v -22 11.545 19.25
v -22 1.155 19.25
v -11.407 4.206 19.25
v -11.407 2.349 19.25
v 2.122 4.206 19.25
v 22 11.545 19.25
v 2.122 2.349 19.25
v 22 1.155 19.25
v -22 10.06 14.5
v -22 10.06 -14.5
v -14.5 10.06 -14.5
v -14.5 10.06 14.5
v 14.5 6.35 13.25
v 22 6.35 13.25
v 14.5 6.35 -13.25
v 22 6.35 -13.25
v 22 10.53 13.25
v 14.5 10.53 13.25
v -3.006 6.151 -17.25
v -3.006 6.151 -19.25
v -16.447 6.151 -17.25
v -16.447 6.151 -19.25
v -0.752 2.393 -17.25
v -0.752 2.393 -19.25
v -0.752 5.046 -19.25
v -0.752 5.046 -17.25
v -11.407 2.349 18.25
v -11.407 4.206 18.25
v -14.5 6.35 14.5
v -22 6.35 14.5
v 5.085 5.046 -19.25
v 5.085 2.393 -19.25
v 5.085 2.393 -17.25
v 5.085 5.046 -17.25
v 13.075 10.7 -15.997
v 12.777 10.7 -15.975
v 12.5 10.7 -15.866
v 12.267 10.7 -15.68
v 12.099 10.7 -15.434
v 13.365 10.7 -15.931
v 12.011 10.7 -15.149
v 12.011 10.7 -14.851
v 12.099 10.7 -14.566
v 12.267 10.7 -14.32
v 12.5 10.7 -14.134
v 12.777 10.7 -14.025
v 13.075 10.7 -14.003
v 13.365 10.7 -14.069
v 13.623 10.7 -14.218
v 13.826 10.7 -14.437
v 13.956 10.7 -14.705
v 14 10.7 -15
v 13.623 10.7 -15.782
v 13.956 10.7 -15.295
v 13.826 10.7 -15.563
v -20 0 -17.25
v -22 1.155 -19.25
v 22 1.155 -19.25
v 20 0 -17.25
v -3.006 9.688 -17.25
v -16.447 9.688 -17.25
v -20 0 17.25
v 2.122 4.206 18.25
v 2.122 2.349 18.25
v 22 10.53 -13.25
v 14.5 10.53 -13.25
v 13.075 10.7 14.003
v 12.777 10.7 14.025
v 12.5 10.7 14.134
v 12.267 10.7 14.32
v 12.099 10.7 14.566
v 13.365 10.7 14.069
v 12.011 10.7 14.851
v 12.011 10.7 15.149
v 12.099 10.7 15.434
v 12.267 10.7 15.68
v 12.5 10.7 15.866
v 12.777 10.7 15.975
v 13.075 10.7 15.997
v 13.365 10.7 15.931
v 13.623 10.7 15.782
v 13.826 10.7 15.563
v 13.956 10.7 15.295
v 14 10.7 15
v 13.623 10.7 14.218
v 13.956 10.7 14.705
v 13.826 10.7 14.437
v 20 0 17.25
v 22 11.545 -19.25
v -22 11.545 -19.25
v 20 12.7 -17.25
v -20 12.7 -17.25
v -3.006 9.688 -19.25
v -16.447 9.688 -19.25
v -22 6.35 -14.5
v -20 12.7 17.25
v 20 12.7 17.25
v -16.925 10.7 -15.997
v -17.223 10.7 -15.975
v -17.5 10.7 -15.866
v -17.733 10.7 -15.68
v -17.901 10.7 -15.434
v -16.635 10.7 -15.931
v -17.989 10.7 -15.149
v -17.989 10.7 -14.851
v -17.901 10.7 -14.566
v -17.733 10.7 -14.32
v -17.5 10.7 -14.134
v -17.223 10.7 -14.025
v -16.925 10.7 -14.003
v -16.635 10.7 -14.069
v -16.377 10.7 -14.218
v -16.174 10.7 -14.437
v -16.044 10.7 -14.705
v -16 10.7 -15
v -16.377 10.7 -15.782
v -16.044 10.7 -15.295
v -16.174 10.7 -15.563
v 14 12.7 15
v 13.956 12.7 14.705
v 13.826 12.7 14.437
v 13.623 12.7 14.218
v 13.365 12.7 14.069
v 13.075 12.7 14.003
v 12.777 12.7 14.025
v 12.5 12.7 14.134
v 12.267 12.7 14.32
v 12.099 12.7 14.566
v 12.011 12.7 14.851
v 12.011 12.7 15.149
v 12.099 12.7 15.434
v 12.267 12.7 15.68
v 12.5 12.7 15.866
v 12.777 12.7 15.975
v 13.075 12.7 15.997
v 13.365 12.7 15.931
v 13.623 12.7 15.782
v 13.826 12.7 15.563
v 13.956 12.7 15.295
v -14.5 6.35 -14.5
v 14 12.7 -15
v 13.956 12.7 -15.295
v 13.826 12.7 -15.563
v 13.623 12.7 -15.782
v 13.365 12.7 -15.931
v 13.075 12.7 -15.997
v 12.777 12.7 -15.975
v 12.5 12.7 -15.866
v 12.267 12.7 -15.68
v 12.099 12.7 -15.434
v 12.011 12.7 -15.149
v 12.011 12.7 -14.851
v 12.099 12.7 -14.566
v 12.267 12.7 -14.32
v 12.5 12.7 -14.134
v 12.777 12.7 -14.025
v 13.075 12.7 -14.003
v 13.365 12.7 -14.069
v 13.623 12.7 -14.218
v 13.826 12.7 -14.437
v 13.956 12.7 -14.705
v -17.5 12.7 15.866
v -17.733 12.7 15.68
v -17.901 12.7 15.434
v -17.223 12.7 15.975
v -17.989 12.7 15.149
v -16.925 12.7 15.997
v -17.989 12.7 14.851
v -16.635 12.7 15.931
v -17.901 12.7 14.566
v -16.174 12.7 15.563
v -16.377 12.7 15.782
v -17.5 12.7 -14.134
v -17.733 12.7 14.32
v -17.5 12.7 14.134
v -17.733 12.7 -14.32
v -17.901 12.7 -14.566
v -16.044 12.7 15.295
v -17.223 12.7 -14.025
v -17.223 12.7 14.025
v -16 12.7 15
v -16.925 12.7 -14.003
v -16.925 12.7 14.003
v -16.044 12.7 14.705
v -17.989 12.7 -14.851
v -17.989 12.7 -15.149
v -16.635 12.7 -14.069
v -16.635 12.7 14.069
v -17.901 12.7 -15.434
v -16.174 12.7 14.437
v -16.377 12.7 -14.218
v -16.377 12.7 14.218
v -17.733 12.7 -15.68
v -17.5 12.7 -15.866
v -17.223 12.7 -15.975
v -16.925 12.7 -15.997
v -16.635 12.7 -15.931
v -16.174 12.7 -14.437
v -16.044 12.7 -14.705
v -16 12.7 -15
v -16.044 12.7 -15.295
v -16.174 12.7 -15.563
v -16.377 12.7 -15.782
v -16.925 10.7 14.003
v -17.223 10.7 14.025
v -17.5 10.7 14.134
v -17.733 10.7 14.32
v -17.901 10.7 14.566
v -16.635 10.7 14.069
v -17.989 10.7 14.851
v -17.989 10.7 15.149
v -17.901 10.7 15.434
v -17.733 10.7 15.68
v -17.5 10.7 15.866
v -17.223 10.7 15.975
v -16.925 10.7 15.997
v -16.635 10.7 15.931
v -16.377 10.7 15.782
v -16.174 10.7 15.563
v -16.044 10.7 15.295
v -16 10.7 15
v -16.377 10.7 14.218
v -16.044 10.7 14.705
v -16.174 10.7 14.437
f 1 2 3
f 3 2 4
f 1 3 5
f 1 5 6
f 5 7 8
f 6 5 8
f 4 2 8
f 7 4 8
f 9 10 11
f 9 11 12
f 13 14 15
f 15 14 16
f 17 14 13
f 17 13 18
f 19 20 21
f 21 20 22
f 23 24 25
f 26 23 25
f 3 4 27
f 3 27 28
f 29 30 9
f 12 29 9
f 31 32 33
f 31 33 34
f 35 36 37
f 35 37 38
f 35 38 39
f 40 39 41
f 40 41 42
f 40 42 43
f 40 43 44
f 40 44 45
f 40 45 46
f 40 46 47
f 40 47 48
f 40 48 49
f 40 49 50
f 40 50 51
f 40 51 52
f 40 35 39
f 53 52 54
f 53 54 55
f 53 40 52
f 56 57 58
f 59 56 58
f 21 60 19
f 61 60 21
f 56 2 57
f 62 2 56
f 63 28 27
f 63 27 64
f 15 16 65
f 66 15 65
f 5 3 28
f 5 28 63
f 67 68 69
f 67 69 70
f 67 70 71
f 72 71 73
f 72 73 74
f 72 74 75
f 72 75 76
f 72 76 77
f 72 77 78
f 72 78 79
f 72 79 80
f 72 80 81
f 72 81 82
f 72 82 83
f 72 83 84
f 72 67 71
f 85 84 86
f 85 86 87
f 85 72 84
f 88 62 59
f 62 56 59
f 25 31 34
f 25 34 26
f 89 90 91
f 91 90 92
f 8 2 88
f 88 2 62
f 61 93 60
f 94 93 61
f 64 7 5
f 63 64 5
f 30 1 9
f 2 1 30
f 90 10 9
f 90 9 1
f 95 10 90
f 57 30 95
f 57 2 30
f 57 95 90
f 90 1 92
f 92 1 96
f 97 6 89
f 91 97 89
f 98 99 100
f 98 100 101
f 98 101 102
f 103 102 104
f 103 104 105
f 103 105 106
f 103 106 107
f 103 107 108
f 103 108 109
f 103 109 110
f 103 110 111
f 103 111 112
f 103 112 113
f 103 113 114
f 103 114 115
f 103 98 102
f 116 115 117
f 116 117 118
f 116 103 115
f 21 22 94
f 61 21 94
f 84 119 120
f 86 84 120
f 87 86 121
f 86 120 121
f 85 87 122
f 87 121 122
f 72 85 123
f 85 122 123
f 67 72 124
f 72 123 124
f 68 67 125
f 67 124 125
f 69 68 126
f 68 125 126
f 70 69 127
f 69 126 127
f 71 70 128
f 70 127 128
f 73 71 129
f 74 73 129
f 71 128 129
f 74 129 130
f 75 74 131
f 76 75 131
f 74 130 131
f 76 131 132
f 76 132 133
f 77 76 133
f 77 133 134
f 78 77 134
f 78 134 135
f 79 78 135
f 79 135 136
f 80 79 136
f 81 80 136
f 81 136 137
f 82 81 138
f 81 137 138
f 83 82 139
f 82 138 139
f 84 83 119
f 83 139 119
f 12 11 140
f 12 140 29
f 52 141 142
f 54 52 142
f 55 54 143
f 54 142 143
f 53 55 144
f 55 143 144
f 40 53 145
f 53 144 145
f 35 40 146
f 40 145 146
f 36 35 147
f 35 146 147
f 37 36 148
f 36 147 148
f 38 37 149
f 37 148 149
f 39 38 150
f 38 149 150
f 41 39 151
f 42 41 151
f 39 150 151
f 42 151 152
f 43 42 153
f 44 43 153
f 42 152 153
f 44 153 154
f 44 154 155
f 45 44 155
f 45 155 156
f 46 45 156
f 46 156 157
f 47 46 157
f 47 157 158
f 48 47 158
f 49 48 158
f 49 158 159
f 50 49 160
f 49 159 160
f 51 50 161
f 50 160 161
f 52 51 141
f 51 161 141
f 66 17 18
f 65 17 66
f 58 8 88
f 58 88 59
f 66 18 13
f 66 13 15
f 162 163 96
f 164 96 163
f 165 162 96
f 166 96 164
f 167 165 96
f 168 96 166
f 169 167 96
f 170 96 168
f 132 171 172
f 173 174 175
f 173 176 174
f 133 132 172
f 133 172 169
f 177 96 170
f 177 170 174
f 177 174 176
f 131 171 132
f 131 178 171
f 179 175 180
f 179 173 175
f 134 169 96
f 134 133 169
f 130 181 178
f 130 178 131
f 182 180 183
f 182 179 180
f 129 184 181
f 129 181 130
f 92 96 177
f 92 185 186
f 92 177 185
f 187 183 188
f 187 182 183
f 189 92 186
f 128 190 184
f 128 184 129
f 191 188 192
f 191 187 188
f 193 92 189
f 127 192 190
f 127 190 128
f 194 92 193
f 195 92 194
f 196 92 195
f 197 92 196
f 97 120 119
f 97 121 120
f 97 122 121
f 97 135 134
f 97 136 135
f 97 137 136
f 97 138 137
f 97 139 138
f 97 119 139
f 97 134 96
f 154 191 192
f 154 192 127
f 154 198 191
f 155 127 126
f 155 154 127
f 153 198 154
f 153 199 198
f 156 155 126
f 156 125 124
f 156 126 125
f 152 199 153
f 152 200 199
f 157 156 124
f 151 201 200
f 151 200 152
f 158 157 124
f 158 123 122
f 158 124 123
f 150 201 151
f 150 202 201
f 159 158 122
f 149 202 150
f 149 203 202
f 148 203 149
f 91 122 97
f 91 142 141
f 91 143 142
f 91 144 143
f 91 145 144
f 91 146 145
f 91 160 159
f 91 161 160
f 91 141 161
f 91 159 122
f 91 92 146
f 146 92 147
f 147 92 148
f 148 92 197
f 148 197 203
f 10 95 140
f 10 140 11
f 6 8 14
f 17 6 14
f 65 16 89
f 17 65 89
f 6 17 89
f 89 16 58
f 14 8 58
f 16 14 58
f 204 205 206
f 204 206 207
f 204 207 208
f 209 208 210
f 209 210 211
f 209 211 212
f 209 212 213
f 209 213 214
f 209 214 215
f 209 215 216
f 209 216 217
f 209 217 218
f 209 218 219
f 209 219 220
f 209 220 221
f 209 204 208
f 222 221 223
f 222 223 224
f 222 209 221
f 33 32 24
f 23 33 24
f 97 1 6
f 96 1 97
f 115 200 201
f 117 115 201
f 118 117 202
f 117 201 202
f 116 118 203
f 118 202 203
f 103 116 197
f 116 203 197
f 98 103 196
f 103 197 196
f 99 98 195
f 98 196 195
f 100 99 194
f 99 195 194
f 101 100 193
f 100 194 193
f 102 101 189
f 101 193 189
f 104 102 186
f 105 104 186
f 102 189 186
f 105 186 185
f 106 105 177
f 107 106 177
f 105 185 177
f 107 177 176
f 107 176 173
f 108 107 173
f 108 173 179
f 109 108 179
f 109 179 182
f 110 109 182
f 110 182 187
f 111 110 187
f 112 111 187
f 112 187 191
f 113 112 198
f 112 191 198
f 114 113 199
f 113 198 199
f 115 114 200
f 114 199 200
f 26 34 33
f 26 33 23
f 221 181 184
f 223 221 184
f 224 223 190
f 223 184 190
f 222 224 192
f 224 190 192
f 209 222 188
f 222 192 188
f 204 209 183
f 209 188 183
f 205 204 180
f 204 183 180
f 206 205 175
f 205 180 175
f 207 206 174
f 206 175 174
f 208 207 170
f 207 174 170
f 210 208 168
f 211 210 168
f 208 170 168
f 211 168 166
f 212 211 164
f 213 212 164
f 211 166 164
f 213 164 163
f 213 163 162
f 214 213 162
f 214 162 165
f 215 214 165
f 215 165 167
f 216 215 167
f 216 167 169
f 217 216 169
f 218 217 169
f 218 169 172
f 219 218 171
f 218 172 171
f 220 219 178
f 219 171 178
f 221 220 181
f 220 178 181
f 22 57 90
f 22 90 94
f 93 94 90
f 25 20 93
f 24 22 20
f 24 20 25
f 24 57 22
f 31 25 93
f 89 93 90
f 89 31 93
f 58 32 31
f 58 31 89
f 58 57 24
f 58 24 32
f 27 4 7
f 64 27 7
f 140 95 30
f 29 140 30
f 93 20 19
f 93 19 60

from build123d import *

# Parameters (mm, degrees)
SKETCH1_W             = 44
SKETCH1_H             = 38.5
BOSS_EXTRUDE1_DEPTH   = 12.7
CHAMFER1_SIZE         = 2
CHAMFER1_SIZE2        = 1.154700538
CHAMFER1_PART_2_SIZE  = 2
CHAMFER1_PART_2_SIZE2 = 1.154700538
SKETCH2_W             = 29
SKETCH2_H             = 3.71
CUT_EXTRUDE1_DEPTH    = 7.5
SKETCH3_W             = 26.5
SKETCH3_H             = 4.18
CUT_EXTRUDE2_DEPTH    = 7.5
SKETCH5_R             = 1
CUT_EXTRUDE3_DEPTH    = 2
SKETCH6_W             = 5.836145695
SKETCH6_H             = 2.652793498
SKETCH6_W_2           = 13.440820391
SKETCH6_H_2           = 3.537057997
CUT_EXTRUDE4_DEPTH    = 2
SKETCH7_W             = 13.529246841
SKETCH7_H             = 1.856955449
CUT_EXTRUDE5_DEPTH    = 1


with BuildPart() as part:
    # Sketch1 → Boss-Extrude1 (new body)
    with BuildSketch(Plane(origin=(0, 0, 0), x_dir=(1, 0, 0), z_dir=(0, 1, 0))):
        Rectangle(SKETCH1_W, SKETCH1_H)
    extrude(amount=BOSS_EXTRUDE1_DEPTH)

    # Chamfer1
    chamfer1_edges = [part.edges().sort_by_distance(p)[0] for p in [
        (-22, 12.7, 0),
        (0, 12.7, 19.25),
        (22, 12.7, 0),
        (0, 12.7, -19.25),
    ]]
    chamfer1_side = [part.faces().sort_by_distance(p)[0] for p in [
        (0, 12.7, 0),
    ]]
    chamfer(chamfer1_edges, length=CHAMFER1_SIZE, length2=CHAMFER1_SIZE2, reference=chamfer1_side[0])

    # Chamfer1 part 2
    chamfer1_part_2_edges = [part.edges().sort_by_distance(p)[0] for p in [
        (0, 0, 19.25),
        (-22, 0, 0),
        (0, 0, -19.25),
        (22, 0, 0),
    ]]
    chamfer1_part_2_side = [part.faces().sort_by_distance(p)[0] for p in [
        (0, 0, 0),
    ]]
    chamfer(chamfer1_part_2_edges, length=CHAMFER1_PART_2_SIZE, length2=CHAMFER1_PART_2_SIZE2, reference=chamfer1_part_2_side[0])

    # Sketch2 → Cut-Extrude1 (cut)
    with BuildSketch(Plane.ZY.offset(22)):
        with Locations((0, 8.205)):
            Rectangle(SKETCH2_W, SKETCH2_H)
    extrude(amount=-CUT_EXTRUDE1_DEPTH, mode=Mode.SUBTRACT)

    # Sketch3 → Cut-Extrude2 (cut)
    with BuildSketch(Plane(origin=(22, 0, 0), x_dir=(0, 0, -1), z_dir=(1, 0, 0))):
        with Locations((0, 8.44)):
            Rectangle(SKETCH3_W, SKETCH3_H)
    extrude(amount=-CUT_EXTRUDE2_DEPTH, mode=Mode.SUBTRACT)

    # Sketch5 → Cut-Extrude3 (cut)
    with BuildSketch(Plane(origin=(0, 12.7, 0), x_dir=(1, 0, 0), z_dir=(0, 1, 0))):
        with Locations((-17, -15)):
            Circle(SKETCH5_R)
        with Locations((-17, 15)):
            Circle(SKETCH5_R)
        with Locations((13, 15)):
            Circle(SKETCH5_R)
        with Locations((13, -15)):
            Circle(SKETCH5_R)
    extrude(amount=-CUT_EXTRUDE3_DEPTH, mode=Mode.SUBTRACT)

    # Sketch6 → Cut-Extrude4 (cut)
    with BuildSketch(Plane(origin=(0, 0, -19.25), x_dir=(-1, 0, 0), z_dir=(0, 0, -1))):
        with Locations((-2.166448024, 3.719313114)):
            Rectangle(SKETCH6_W, SKETCH6_H)
        with Locations((9.726909494, 7.919569487)):
            Rectangle(SKETCH6_W_2, SKETCH6_H_2)
    extrude(amount=-CUT_EXTRUDE4_DEPTH, mode=Mode.SUBTRACT)

    # Sketch7 → Cut-Extrude5 (cut)
    with BuildSketch(Plane.XY.offset(19.25)):
        with Locations((-4.642388622, 3.277180865)):
            Rectangle(SKETCH7_W, SKETCH7_H)
    extrude(amount=-CUT_EXTRUDE5_DEPTH, mode=Mode.SUBTRACT)


solid = part.part
